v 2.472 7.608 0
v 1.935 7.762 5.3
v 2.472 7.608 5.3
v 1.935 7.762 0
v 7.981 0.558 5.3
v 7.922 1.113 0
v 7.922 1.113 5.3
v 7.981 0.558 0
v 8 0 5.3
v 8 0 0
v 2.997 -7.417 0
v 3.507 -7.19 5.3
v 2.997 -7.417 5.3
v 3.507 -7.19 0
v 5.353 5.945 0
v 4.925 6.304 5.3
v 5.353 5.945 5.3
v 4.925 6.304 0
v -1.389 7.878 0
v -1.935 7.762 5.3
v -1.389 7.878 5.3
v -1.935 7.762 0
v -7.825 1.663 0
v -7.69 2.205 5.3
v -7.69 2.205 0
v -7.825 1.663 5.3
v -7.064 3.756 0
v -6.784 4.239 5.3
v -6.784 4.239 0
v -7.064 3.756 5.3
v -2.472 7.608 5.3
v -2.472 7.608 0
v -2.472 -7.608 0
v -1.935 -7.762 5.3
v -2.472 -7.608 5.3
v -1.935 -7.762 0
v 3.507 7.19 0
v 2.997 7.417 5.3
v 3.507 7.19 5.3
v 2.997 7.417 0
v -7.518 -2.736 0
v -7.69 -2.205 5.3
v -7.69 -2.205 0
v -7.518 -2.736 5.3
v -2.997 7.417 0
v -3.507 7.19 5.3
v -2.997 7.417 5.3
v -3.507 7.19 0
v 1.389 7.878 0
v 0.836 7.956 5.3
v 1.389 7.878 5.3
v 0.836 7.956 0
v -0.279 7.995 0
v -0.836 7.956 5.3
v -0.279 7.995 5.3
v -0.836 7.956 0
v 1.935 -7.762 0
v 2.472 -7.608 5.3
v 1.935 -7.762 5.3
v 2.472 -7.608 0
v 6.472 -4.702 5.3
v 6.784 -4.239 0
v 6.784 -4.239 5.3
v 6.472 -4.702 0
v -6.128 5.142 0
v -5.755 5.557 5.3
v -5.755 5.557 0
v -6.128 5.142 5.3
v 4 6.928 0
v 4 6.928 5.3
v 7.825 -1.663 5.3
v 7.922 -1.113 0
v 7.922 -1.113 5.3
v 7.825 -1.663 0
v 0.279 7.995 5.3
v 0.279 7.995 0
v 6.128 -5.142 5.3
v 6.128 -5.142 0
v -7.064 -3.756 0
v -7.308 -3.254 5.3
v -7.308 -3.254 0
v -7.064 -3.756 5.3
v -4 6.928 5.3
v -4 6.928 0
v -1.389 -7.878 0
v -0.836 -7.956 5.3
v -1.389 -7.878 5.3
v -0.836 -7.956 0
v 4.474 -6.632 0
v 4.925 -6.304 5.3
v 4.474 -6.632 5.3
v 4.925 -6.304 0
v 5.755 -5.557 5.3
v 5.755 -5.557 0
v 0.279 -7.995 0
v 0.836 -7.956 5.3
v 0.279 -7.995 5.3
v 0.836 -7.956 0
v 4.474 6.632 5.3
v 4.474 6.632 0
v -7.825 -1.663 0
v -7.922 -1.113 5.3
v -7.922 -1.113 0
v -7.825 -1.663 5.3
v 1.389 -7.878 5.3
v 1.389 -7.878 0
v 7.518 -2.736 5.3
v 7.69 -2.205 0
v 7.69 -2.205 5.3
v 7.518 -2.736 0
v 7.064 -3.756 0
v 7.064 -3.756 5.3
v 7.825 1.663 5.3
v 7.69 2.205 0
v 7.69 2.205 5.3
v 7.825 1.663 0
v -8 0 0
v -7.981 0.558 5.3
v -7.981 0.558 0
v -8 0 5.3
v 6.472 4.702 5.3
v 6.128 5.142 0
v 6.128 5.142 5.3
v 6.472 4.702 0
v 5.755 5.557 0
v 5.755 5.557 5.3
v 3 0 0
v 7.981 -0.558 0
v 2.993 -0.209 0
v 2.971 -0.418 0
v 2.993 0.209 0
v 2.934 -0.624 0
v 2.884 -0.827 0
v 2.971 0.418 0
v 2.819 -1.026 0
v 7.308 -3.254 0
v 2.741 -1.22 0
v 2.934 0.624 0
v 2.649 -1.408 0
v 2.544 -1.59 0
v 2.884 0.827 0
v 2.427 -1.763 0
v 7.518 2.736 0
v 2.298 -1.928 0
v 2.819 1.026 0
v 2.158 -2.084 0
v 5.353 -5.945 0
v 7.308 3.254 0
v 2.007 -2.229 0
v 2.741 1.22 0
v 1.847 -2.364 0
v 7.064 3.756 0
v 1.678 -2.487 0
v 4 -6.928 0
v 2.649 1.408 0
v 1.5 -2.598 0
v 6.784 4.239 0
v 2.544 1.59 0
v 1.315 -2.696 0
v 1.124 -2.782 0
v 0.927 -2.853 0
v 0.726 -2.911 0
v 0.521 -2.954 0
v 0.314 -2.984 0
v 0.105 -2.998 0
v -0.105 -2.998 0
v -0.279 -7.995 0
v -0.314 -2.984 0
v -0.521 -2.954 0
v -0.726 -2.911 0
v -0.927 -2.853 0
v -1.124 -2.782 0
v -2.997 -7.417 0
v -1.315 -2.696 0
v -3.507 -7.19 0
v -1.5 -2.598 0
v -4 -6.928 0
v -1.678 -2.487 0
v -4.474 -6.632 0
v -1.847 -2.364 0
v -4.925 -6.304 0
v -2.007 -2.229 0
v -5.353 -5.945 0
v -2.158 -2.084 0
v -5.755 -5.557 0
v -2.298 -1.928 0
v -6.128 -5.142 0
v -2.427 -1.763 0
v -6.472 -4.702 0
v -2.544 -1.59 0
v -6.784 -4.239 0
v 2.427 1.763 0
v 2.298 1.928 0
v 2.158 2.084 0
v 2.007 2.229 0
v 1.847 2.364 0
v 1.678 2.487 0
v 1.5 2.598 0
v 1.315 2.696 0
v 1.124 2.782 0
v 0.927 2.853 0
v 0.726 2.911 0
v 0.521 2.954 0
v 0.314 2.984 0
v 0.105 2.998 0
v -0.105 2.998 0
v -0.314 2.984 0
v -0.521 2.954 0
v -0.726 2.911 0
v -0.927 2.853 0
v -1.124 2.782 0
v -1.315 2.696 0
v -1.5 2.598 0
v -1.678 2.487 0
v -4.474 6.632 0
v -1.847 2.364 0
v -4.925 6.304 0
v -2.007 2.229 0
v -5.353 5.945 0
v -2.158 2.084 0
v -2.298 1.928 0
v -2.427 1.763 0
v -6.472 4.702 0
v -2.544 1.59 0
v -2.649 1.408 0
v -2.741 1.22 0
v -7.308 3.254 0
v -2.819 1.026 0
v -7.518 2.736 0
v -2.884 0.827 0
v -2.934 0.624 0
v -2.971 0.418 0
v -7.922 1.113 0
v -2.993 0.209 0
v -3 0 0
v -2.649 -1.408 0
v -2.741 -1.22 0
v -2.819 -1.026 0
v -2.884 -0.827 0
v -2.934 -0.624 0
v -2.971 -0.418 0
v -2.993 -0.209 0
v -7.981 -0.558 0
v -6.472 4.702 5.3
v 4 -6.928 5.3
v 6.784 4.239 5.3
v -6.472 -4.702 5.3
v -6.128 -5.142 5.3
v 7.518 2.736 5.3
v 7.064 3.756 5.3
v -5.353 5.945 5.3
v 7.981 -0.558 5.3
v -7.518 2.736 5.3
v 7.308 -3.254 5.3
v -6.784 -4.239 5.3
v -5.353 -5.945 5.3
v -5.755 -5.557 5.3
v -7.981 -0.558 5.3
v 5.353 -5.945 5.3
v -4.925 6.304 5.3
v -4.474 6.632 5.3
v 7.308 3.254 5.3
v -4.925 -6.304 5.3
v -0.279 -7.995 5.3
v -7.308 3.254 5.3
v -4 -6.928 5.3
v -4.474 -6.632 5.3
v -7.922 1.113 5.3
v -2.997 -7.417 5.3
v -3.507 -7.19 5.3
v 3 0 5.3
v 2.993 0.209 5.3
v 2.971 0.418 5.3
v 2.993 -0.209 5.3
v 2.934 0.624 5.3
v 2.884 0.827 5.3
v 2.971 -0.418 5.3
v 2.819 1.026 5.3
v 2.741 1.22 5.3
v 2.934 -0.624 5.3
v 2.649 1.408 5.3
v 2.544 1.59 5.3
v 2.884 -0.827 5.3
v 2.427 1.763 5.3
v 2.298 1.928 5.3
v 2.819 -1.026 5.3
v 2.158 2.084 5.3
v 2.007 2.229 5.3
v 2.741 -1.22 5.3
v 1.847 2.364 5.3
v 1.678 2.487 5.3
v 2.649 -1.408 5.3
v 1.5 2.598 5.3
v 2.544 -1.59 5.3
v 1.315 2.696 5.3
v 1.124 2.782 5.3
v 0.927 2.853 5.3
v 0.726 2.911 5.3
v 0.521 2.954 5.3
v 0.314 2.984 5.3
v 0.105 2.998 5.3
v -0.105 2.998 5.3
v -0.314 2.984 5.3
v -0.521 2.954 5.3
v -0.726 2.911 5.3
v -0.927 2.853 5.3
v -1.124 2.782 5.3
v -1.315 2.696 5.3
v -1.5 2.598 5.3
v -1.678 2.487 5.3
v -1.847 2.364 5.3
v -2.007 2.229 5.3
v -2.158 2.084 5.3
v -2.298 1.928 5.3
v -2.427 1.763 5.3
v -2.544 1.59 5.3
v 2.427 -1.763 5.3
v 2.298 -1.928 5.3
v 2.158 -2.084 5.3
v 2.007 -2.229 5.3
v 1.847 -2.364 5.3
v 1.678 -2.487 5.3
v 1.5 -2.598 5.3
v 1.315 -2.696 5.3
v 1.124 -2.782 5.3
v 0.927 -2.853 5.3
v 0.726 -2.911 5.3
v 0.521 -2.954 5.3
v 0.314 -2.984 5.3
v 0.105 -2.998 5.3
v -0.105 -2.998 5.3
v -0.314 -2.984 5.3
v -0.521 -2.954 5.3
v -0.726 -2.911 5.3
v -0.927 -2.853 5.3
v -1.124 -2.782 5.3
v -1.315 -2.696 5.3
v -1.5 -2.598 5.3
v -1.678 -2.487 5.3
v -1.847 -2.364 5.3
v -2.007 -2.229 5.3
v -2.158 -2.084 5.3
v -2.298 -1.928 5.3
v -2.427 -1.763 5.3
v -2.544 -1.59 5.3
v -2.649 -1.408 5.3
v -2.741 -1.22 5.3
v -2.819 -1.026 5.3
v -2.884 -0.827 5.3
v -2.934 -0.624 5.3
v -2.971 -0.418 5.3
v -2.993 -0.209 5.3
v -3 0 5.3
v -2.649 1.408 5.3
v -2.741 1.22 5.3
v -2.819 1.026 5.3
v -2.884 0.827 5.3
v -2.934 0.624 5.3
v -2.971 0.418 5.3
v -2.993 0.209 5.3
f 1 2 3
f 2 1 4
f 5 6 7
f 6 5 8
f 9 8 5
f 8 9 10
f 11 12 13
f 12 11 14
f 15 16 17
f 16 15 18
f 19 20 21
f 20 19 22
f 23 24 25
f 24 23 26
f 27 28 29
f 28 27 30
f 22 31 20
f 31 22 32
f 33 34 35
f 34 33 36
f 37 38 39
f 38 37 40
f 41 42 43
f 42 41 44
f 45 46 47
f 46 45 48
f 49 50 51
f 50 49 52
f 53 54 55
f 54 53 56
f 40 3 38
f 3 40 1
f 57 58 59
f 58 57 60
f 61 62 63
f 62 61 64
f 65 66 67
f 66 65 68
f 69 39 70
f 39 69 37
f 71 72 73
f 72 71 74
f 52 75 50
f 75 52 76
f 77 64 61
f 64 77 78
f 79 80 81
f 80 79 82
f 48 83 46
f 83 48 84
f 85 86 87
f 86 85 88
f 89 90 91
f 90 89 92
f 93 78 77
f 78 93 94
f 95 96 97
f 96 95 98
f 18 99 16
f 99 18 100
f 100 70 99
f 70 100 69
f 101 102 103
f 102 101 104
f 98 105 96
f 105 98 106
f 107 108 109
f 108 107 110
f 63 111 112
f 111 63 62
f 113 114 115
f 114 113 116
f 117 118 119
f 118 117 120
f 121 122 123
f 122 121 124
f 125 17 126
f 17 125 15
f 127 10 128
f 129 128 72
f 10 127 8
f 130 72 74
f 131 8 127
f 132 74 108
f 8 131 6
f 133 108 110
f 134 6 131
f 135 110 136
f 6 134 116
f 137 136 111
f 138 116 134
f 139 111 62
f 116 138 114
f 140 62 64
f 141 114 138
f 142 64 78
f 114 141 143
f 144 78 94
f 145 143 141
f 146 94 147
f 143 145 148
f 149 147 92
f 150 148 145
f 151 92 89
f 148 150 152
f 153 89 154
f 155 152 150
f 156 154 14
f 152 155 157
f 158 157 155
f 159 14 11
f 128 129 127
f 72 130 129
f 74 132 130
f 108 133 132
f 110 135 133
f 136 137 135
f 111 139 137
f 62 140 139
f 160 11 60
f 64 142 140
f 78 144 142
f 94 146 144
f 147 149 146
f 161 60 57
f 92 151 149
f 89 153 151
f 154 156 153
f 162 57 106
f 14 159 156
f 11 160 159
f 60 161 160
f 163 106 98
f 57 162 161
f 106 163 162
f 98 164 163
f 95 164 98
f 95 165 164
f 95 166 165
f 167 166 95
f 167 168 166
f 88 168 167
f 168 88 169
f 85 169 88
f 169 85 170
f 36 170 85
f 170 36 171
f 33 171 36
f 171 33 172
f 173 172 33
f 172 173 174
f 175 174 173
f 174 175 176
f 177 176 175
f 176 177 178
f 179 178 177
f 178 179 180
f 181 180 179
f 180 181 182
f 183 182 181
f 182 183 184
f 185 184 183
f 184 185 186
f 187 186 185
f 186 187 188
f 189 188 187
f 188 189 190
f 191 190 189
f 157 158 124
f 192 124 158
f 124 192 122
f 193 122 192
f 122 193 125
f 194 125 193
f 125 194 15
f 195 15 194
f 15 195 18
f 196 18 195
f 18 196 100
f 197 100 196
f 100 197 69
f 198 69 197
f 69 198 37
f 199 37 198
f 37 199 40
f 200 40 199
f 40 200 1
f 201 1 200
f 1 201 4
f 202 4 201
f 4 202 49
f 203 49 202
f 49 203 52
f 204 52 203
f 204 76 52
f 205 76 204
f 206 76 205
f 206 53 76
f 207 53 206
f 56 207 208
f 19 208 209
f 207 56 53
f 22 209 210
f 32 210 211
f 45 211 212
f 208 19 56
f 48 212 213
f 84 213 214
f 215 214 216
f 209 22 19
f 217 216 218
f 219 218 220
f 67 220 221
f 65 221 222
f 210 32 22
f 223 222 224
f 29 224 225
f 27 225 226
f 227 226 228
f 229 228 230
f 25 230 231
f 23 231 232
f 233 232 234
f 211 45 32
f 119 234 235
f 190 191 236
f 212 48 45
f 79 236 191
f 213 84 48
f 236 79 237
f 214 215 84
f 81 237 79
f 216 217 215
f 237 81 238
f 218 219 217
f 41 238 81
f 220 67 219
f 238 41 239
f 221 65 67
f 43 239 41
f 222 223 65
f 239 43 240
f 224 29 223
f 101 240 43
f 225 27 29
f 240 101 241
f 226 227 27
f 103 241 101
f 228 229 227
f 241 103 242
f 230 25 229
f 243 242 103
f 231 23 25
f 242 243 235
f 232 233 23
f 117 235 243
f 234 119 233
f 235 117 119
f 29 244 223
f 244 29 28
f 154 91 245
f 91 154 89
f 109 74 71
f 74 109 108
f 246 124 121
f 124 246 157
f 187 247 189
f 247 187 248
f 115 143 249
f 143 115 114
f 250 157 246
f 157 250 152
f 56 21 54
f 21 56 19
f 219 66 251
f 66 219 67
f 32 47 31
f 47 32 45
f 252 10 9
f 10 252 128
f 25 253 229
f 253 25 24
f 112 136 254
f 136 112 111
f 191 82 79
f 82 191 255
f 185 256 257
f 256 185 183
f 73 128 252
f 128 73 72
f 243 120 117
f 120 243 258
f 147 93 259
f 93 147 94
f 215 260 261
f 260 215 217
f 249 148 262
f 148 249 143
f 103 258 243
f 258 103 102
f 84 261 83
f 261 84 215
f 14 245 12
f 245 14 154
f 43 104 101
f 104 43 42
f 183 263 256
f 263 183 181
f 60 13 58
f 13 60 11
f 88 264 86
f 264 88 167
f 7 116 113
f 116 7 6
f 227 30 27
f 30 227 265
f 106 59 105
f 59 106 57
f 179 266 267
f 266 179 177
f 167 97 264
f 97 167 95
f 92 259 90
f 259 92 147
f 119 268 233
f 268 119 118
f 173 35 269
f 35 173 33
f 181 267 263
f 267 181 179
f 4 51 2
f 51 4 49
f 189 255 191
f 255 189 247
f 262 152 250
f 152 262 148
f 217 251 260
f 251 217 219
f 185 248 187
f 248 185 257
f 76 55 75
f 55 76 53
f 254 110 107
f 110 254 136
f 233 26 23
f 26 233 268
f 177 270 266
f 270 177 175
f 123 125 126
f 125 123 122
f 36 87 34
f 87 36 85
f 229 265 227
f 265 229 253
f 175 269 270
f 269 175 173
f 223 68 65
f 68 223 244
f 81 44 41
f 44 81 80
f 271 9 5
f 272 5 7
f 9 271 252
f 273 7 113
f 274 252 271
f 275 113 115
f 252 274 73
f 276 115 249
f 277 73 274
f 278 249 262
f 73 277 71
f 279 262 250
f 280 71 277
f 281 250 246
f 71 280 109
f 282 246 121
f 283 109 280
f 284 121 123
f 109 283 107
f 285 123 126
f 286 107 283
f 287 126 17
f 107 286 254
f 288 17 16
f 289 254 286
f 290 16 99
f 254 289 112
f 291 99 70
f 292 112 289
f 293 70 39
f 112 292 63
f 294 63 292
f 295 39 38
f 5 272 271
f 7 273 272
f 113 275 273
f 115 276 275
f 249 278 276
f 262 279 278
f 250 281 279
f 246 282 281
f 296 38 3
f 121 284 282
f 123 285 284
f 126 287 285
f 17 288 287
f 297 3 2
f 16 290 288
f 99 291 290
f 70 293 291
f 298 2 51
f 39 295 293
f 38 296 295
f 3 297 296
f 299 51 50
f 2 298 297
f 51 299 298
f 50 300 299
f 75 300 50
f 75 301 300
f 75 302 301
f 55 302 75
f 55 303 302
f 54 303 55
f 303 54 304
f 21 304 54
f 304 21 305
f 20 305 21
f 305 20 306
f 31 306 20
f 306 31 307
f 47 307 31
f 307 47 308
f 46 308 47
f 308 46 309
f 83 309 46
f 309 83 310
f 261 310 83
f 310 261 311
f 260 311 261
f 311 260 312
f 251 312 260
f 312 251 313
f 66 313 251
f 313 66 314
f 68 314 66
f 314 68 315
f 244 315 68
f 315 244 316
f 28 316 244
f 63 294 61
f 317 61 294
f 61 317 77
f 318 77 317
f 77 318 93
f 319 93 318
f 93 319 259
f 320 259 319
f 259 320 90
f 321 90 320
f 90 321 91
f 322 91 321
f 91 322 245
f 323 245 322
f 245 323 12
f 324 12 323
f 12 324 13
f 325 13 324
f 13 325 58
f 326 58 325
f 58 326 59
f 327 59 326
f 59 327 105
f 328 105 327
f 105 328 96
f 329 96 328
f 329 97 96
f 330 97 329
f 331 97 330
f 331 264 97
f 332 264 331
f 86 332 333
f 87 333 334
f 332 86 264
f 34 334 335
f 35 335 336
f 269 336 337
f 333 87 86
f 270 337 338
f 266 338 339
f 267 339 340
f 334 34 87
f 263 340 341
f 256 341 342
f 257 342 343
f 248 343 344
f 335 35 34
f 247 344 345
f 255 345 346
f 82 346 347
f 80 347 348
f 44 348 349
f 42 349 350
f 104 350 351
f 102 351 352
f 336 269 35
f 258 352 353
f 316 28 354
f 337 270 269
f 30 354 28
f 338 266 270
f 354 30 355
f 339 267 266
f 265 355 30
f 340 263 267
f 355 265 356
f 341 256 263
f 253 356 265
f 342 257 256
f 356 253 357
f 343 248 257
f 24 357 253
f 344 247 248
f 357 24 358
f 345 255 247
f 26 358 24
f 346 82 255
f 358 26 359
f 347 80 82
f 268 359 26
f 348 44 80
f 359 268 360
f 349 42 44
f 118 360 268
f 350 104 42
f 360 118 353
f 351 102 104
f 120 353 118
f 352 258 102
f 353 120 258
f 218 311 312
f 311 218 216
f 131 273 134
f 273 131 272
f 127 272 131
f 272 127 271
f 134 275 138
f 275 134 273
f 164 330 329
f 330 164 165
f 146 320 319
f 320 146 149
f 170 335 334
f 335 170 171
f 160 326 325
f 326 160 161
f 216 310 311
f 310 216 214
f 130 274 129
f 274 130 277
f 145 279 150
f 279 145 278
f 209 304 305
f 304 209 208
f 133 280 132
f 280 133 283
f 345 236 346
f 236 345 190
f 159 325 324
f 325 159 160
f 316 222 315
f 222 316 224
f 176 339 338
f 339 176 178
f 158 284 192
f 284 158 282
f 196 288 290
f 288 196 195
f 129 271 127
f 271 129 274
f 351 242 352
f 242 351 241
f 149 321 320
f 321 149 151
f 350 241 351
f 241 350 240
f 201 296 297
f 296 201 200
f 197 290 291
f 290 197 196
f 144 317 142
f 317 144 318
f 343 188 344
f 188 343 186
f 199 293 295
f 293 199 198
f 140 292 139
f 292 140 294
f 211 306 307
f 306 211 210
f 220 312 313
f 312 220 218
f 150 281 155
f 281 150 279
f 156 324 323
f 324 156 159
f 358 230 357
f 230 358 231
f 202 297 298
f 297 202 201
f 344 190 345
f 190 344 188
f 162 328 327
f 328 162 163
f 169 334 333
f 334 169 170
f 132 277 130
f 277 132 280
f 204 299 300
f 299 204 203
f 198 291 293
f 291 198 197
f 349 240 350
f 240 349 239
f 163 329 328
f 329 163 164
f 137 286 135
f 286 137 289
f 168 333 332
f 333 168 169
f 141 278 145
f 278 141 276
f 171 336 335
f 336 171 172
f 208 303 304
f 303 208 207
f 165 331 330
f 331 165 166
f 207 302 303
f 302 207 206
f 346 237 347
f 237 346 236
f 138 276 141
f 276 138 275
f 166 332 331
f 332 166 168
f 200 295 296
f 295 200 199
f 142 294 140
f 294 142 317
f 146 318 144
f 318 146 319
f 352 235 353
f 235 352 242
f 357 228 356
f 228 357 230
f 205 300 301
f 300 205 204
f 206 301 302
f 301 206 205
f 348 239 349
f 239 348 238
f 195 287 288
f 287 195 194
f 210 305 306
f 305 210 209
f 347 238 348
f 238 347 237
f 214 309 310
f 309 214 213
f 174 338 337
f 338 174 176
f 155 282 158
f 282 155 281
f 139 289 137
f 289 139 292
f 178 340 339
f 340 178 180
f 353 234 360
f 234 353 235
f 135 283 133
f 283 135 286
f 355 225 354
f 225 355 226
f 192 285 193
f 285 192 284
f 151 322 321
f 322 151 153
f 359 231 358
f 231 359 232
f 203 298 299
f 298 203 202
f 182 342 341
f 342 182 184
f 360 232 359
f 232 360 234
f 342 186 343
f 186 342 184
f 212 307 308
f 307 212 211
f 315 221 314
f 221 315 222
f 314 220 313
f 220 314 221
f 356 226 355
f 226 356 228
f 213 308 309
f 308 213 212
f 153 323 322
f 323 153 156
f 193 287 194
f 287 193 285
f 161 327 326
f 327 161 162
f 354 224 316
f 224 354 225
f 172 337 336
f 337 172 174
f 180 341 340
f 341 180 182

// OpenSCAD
$fn=90;
screw=6;
to_wall=5;
od=to_wall*2+screw;
height=5.3;
pad=0.1;

difference() {
    cylinder(d=od,h=height);
    translate([0,0,-pad])
    cylinder(d=screw,h=height+pad*2);
}
